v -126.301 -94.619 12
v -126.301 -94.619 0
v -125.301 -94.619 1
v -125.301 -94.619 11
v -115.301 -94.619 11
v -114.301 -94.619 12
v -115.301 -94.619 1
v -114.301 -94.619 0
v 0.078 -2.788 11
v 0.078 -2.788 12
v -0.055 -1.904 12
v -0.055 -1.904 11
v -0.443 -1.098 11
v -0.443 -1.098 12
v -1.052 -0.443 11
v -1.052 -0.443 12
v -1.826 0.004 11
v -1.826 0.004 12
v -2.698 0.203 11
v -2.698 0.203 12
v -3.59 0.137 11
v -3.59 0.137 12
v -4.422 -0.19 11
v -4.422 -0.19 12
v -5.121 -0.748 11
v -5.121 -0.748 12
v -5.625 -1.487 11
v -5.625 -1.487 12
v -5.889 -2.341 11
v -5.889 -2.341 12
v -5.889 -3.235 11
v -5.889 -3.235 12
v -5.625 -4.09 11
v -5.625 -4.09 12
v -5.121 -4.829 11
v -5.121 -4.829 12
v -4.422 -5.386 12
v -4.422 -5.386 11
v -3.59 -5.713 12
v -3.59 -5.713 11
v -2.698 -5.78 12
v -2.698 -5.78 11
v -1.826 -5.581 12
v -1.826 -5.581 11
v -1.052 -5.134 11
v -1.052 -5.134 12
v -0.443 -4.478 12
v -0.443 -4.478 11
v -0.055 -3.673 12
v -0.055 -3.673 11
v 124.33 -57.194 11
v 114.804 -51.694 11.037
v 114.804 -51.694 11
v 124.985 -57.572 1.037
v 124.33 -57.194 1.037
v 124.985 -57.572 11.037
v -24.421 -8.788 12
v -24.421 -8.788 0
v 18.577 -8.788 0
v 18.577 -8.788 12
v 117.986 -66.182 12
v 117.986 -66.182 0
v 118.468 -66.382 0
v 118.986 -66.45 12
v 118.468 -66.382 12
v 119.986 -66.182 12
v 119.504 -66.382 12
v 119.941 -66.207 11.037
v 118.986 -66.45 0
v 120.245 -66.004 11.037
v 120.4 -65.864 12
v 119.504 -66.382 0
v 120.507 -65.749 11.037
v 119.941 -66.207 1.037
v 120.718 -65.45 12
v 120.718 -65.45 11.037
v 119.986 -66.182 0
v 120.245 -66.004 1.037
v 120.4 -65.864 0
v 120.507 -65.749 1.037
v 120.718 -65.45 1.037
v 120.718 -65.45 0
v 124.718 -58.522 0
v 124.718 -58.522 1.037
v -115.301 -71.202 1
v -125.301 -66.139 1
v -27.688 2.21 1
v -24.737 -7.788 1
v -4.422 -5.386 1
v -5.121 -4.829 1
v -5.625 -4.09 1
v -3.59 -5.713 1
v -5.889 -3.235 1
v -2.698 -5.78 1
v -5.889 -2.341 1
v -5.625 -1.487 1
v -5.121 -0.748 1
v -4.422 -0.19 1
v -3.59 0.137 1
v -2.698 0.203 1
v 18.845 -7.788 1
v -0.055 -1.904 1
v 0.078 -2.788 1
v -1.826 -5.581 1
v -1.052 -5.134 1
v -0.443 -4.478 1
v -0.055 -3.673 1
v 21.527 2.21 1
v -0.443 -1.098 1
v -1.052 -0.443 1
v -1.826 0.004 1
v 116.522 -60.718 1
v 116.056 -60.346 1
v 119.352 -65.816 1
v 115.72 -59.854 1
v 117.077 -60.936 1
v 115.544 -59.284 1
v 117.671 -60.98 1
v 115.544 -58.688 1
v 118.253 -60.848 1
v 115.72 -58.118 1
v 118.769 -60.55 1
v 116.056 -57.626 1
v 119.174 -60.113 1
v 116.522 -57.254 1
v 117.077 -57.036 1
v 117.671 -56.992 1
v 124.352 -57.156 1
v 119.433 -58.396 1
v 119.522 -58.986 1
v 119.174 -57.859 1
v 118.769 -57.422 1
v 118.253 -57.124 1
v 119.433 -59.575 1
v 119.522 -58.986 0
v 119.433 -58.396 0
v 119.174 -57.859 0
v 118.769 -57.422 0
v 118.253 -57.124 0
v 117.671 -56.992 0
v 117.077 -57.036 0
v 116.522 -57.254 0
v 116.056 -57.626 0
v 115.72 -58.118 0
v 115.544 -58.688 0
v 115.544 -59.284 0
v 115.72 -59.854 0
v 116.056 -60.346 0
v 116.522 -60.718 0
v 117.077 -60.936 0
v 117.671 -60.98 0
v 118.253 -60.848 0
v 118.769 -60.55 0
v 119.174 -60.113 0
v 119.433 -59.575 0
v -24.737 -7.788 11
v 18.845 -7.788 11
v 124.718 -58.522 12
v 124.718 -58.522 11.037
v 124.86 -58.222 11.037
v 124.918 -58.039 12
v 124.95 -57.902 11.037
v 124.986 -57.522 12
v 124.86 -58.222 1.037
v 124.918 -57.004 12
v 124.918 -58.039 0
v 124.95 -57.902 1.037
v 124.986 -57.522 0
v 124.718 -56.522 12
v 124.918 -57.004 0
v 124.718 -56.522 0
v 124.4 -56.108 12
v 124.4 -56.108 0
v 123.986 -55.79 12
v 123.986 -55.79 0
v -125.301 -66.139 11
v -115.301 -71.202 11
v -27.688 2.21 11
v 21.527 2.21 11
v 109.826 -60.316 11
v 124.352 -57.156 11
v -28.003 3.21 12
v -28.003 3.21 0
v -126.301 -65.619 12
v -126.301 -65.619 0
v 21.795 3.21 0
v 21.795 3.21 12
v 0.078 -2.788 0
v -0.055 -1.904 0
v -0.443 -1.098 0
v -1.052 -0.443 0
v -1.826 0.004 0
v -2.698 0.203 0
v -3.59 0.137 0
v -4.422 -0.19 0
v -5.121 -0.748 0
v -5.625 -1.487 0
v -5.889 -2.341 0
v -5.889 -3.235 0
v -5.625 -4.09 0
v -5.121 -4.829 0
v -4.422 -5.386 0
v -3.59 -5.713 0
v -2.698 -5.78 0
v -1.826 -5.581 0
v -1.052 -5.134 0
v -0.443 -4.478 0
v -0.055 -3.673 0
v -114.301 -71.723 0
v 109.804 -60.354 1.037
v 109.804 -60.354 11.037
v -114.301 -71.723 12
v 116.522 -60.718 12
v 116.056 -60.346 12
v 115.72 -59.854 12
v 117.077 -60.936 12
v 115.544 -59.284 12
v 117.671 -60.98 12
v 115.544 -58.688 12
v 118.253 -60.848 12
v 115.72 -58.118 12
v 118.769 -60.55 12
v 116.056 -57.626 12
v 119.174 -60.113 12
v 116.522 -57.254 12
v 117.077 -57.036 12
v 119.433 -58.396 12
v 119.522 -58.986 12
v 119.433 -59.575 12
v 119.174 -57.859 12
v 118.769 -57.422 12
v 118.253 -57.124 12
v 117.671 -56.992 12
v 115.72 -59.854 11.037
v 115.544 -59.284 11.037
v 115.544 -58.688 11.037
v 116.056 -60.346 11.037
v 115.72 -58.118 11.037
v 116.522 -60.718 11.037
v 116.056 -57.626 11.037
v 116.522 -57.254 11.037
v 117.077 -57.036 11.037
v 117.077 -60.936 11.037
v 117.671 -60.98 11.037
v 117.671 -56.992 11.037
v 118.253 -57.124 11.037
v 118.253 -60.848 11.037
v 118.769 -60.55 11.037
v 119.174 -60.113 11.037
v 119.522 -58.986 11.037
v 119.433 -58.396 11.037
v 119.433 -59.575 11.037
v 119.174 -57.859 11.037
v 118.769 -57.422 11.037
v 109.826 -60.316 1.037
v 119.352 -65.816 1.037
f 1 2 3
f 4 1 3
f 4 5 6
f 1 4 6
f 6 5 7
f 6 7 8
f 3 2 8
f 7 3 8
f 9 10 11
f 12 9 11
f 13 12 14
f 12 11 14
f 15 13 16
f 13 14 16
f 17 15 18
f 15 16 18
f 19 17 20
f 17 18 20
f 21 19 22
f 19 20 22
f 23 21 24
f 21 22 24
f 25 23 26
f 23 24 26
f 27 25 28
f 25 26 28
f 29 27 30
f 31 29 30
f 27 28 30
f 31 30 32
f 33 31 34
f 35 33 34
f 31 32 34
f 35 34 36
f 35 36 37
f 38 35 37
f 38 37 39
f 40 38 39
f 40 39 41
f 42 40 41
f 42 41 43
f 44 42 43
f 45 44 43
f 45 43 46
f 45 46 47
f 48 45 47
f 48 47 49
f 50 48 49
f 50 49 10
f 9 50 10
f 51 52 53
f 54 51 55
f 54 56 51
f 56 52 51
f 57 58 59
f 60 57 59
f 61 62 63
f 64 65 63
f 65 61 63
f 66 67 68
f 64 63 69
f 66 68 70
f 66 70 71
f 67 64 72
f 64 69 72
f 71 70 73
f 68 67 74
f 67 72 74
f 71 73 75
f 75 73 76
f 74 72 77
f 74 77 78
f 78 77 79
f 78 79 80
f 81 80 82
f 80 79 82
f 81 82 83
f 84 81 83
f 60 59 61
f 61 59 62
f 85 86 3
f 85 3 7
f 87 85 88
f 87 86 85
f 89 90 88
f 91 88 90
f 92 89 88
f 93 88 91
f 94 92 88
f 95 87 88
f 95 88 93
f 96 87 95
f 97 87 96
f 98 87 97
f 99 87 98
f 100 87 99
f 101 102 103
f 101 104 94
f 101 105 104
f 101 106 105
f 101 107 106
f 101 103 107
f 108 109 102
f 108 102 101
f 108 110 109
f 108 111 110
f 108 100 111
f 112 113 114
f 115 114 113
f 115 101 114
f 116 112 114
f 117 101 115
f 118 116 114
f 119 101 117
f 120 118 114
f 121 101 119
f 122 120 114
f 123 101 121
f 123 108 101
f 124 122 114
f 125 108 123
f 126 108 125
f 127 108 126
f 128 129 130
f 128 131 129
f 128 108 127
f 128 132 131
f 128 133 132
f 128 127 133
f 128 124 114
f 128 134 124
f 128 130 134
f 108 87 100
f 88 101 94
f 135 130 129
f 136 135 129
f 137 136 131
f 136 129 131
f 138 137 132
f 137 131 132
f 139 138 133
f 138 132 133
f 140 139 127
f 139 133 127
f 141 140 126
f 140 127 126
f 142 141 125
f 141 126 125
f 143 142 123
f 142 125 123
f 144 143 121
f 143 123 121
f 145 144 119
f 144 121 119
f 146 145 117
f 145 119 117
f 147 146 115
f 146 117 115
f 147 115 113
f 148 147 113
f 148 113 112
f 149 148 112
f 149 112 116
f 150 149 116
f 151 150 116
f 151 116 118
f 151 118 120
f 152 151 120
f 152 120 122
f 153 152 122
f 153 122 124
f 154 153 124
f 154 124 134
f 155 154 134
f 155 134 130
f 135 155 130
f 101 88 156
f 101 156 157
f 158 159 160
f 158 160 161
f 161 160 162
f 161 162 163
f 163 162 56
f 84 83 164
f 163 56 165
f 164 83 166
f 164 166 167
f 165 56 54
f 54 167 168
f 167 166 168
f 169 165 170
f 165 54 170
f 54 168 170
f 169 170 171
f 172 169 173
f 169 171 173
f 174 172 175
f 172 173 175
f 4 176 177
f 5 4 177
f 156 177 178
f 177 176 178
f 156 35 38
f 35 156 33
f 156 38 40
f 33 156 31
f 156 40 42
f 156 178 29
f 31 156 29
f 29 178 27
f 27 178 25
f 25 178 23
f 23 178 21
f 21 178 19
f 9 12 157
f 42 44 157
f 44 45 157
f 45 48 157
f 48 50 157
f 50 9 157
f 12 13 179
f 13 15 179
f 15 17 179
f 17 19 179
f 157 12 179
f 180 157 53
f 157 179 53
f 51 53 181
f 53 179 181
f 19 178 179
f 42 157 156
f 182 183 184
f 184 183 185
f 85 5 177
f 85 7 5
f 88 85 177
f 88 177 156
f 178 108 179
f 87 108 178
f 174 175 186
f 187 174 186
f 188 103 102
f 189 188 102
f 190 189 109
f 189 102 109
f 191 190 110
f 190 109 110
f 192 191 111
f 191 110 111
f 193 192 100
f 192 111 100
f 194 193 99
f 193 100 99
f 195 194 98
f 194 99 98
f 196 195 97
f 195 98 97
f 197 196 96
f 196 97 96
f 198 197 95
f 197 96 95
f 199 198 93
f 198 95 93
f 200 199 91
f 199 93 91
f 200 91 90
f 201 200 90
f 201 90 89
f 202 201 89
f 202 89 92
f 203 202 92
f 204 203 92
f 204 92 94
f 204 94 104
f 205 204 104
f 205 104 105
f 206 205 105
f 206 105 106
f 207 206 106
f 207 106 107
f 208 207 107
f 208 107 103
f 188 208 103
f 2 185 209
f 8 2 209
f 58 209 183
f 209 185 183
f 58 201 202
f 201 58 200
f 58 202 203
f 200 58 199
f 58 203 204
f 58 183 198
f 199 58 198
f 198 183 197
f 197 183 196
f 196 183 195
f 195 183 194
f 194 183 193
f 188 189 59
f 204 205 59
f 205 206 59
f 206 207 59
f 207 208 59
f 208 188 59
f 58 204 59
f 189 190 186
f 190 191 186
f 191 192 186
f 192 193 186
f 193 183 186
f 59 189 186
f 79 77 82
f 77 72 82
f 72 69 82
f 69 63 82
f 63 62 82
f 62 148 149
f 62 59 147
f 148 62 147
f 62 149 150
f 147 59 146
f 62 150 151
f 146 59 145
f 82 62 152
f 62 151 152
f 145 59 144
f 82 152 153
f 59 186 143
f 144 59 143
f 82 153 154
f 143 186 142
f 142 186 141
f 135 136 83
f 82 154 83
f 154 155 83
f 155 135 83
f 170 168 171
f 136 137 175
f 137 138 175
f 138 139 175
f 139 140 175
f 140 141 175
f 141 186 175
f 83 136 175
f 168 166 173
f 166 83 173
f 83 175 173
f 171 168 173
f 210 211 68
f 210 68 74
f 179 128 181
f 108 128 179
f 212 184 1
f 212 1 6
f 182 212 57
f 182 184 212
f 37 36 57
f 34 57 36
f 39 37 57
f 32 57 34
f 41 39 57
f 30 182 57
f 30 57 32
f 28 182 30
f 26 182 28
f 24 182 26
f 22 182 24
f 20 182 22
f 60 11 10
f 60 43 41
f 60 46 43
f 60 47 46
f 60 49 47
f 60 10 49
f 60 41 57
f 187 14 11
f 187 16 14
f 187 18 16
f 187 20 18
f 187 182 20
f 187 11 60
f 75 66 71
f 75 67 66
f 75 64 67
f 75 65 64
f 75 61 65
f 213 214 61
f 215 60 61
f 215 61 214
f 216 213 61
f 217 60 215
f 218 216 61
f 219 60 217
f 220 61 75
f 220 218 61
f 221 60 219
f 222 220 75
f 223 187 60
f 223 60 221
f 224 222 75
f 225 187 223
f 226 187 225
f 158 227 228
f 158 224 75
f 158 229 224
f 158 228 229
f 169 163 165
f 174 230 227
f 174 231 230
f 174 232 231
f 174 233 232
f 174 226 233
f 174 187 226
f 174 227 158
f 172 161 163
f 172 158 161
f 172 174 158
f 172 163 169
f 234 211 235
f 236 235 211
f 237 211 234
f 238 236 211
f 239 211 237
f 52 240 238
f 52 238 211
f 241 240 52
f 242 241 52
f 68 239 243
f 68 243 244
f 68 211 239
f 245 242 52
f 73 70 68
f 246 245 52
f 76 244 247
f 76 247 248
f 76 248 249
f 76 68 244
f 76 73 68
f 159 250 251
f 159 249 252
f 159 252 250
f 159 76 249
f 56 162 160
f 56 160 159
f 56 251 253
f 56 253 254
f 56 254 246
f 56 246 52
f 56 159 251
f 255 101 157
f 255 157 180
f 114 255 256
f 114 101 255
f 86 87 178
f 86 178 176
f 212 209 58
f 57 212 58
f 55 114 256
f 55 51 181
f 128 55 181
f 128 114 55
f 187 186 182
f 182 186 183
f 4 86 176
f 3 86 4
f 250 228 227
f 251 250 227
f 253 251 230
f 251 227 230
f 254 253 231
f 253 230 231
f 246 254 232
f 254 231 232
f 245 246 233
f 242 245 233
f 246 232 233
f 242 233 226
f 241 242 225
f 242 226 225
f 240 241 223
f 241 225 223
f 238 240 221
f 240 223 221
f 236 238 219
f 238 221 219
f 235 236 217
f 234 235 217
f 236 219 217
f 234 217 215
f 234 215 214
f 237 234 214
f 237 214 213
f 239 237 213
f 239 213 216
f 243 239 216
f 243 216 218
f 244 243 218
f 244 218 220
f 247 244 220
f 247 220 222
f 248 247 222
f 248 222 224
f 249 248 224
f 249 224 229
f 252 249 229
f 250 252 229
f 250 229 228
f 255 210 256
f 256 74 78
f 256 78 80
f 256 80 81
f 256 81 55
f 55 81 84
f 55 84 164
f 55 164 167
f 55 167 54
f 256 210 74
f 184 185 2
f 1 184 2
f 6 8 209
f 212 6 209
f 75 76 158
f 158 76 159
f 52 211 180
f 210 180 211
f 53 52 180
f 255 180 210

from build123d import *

# Parameters (mm, degrees)
BOSS_EXTRUDE1_DEPTH = 12
SHELL1_T            = -1
SKETCH3_R           = 3
SKETCH3_R_2         = 2
CUT_EXTRUDE1_DEPTH  = 12
SKETCH4_W           = 10
SKETCH4_H           = 10
CUT_EXTRUDE2_DEPTH  = 12
FILLET1_R           = 2


with BuildPart() as part:
    # Sketch2 → Boss-Extrude1 (new body)
    with BuildSketch(Plane.XY):
        Polygon((-28.002919882, 3.210239845), (-126.301165196, -65.618932518), (-126.301165196, -94.618932518), (-114.301165196, -94.618932518), (-114.301165196, -71.722772739), (-24.421364281, -8.788258605), (18.577059182, -8.788258605), (119.718098707, -67.182065001), (125.718098707, -56.789760155), (21.795050253, 3.210239845), align=None)
    extrude(amount=BOSS_EXTRUDE1_DEPTH)

    # Shell1
    shell1_openings = [part.faces().sort_by_distance(p)[0] for p in [
        (-120.301165196, -94.618932518, 6),
    ]]
    offset(amount=SHELL1_T, openings=shell1_openings, kind=Kind.INTERSECTION)

    # Sketch3 → Cut-Extrude1 (cut)
    with BuildSketch(Plane.XY.offset(12)):
        with Locations((-2.922152549, -2.788258605)):
            Circle(SKETCH3_R)
        with Locations((117.521946284, -58.985912578)):
            Circle(SKETCH3_R_2)
    extrude(amount=-CUT_EXTRUDE1_DEPTH, mode=Mode.SUBTRACT)

    # Sketch4 → Cut-Extrude2 (cut)
    with BuildSketch(Plane(origin=(118.879261515, -68.634973637, 0), x_dir=(0, 0, -1), z_dir=(0.8660254037844357, -0.500000000000005, 0))):
        with Locations((-6.037142442, 7.633616623)):
            Rectangle(SKETCH4_W, SKETCH4_H)
    extrude(amount=-CUT_EXTRUDE2_DEPTH, mode=Mode.SUBTRACT)

    # Fillet1
    # the kernel refuses this fillet: 2 mm, written as the material it takes off along each edge
    with BuildSketch(Plane(origin=(119.718098707, -67.182065001, -5), x_dir=(0.499999999999999, 0.8660254037844393, 0), z_dir=(0, 0, 1)), Plane(origin=(125.718098707, -56.789760155, -5), x_dir=(-0.8660254037844393, 0.499999999999999, 0), z_dir=(0, 0, 1))) as fillet1_piece_1:
        with BuildLine():
            CenterArc((FILLET1_R, FILLET1_R), FILLET1_R, 180, 90)
            Line((0, FILLET1_R), (0, 0))
            Line((0, 0), (FILLET1_R, 0))
        make_face()
    extrude(amount=22, mode=Mode.SUBTRACT)


solid = part.part
